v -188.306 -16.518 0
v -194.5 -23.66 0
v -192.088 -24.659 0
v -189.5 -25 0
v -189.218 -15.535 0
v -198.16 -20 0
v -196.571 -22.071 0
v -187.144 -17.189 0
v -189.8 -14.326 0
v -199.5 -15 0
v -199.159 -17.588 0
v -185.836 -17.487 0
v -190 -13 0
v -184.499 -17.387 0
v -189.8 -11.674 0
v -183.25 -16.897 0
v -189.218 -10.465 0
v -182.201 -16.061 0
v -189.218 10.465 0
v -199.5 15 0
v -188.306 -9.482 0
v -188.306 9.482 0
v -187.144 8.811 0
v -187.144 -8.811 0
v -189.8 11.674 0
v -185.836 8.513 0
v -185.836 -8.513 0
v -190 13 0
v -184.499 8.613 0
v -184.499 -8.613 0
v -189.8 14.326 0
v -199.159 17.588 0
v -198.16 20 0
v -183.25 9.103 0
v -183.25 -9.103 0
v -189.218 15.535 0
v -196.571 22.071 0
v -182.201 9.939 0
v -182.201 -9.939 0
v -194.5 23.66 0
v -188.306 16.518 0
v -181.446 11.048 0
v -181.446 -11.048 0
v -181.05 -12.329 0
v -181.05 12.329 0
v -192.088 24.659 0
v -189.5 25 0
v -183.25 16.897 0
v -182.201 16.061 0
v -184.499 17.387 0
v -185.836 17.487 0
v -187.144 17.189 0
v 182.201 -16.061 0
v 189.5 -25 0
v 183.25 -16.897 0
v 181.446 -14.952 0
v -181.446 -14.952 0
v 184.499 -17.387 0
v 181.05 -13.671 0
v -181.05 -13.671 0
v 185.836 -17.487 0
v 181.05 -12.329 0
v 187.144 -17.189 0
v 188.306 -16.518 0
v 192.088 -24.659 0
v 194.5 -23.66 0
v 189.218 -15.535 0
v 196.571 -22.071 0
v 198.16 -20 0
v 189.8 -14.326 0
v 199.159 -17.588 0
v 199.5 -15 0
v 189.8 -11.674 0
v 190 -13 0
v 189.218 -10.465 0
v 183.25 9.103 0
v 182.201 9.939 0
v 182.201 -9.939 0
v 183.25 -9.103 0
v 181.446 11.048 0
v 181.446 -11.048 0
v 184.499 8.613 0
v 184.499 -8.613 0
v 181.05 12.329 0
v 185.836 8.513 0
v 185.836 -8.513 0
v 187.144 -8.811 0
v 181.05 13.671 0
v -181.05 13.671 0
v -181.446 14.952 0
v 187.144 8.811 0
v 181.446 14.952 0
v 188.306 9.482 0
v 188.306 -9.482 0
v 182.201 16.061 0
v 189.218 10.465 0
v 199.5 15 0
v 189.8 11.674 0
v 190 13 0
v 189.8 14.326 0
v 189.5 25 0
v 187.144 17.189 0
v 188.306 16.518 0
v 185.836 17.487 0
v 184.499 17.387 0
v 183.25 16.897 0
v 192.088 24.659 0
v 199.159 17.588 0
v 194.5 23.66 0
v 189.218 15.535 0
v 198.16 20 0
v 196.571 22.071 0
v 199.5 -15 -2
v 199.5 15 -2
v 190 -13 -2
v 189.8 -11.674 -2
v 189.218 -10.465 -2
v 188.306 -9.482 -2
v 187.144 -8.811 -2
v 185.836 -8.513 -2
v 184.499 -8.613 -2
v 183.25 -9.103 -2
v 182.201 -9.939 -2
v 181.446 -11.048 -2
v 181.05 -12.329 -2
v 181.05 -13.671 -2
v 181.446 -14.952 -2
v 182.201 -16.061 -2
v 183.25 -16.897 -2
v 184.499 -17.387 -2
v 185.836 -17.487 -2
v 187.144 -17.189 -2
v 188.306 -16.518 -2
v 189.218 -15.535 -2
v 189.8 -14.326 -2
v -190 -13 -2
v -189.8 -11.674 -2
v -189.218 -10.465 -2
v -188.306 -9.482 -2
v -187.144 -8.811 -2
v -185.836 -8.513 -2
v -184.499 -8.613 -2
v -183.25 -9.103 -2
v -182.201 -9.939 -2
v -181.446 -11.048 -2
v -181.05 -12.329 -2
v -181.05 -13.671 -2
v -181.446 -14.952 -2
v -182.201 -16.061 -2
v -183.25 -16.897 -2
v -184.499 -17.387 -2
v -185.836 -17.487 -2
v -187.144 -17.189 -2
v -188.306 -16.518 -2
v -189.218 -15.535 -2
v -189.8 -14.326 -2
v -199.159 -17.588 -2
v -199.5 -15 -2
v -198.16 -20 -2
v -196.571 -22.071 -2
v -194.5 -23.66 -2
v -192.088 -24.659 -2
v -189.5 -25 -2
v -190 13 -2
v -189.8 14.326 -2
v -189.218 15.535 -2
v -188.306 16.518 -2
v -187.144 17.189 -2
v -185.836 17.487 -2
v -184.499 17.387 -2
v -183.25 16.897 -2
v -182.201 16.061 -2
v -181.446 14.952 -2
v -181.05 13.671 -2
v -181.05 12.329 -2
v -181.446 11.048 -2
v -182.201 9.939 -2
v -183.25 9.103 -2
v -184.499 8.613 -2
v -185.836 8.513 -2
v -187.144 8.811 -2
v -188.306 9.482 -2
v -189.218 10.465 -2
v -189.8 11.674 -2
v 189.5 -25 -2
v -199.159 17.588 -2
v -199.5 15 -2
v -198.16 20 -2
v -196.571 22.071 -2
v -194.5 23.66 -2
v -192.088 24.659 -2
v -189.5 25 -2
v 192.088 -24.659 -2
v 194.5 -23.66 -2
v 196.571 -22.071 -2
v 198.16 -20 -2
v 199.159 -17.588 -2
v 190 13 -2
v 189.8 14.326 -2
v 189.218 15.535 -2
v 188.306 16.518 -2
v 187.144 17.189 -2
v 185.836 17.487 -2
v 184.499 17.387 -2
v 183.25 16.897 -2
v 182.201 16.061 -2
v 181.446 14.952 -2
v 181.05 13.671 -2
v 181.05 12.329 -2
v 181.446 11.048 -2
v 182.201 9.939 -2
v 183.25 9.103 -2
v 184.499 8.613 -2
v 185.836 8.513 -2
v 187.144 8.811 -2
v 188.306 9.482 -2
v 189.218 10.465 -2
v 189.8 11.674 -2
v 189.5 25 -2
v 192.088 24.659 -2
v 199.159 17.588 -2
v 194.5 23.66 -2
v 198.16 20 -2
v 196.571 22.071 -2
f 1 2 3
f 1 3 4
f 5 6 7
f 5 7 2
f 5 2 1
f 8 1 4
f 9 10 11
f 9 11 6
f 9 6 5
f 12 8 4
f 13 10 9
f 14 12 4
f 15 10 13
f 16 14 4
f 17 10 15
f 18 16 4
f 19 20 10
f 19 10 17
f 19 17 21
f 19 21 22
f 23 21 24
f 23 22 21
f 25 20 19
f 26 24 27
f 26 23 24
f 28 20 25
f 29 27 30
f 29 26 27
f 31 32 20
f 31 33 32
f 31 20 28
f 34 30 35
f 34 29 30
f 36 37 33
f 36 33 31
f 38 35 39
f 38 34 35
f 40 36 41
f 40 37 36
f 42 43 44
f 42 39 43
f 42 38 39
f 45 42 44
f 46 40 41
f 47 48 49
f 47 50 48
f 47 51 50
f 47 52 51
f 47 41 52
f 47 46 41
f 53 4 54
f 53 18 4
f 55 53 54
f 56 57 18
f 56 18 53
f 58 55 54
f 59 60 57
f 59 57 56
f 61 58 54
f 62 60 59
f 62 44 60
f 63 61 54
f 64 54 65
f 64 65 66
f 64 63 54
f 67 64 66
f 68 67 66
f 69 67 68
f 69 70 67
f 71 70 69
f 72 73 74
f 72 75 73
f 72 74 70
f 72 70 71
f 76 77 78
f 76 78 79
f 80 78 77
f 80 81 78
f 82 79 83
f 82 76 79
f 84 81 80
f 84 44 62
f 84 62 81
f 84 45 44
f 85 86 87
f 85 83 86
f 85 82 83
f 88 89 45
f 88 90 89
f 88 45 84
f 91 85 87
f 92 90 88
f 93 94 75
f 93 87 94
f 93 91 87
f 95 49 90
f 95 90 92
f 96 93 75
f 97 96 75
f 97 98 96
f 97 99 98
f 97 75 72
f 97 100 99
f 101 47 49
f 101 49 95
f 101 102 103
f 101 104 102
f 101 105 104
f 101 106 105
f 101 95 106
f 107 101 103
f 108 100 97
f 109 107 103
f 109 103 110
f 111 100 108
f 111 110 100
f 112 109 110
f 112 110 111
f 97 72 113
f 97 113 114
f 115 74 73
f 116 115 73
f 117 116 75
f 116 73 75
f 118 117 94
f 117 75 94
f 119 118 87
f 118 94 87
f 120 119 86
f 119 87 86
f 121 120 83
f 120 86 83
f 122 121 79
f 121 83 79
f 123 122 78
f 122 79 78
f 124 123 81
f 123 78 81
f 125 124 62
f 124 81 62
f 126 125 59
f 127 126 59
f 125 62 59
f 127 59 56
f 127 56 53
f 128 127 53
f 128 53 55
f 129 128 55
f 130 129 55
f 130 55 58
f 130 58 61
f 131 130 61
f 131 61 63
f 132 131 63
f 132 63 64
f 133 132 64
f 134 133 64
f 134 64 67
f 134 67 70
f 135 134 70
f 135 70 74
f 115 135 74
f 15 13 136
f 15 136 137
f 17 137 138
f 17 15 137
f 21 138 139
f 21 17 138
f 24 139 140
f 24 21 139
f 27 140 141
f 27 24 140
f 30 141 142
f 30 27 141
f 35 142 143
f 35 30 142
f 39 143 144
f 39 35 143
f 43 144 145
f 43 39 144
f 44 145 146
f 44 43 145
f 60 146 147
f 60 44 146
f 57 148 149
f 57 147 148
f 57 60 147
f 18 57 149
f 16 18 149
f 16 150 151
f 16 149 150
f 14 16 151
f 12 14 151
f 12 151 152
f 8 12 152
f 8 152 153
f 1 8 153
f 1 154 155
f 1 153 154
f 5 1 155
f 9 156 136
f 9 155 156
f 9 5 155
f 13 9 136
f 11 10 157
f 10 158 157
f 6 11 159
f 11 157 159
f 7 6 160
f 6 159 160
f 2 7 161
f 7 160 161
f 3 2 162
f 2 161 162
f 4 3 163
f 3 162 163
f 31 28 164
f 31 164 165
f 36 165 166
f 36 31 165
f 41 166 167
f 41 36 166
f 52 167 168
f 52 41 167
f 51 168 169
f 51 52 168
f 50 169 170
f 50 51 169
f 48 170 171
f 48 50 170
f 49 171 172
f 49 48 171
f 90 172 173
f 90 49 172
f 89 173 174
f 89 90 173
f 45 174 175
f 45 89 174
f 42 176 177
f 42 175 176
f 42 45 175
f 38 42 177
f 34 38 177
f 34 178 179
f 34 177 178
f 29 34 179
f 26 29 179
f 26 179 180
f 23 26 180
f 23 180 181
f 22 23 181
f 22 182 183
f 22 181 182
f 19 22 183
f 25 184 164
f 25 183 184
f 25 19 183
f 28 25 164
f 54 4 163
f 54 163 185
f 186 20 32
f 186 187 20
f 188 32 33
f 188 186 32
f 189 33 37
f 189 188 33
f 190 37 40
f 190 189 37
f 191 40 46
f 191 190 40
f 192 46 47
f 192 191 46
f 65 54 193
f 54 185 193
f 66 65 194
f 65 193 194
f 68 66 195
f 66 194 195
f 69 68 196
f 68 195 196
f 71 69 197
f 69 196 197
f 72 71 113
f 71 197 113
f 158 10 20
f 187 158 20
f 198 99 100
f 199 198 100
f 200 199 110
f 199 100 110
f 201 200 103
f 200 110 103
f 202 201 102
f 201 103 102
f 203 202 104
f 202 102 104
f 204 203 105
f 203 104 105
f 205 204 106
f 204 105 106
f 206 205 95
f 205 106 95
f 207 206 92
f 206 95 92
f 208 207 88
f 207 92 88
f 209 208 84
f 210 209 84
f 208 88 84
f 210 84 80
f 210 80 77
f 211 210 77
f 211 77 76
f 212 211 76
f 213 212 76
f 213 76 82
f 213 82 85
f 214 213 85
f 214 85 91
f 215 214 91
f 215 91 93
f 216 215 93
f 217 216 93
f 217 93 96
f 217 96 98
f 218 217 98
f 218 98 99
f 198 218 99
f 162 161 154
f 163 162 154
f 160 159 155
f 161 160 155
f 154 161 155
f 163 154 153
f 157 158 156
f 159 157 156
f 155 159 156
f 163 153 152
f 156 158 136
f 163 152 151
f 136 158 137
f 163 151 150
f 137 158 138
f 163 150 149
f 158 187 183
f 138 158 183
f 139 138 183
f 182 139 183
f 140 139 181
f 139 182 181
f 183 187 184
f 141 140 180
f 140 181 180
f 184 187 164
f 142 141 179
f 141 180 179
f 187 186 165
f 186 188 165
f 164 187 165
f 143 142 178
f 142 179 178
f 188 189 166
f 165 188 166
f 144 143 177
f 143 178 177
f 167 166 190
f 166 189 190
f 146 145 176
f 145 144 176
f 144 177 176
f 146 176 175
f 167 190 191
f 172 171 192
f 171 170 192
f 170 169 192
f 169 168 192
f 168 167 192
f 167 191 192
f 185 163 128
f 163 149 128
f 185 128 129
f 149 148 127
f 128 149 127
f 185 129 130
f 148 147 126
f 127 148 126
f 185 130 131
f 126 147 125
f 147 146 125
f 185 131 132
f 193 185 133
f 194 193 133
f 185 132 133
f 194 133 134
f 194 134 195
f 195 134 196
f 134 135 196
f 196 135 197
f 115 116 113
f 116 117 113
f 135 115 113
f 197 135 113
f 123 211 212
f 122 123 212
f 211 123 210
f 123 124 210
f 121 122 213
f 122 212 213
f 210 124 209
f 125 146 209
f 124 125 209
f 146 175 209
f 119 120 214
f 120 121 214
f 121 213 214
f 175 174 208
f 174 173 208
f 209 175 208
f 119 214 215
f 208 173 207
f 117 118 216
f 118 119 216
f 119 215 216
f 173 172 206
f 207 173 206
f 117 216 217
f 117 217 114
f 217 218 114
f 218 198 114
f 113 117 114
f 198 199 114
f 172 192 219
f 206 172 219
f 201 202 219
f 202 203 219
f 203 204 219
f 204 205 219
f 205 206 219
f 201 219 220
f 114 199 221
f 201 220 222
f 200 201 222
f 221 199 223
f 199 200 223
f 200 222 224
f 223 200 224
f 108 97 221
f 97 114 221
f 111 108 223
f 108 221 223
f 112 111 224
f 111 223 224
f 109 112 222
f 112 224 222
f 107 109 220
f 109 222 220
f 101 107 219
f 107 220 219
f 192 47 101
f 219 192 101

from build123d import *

# Parameters (mm, degrees)
SKETCH1_W            = 399
SKETCH1_H            = 50
BASE_FLANGE1_DEPTH   = 2
FILLET1_R            = 10
M8_CLEARANCE_HOLE1_D = 9


# Sheet-metal steps are written as plain solids
with BuildPart() as part:
    # Sketch1 → Base-Flange1 (new body)
    with BuildSketch(Plane.XY):
        Rectangle(SKETCH1_W, SKETCH1_H)
    extrude(amount=-BASE_FLANGE1_DEPTH)

    # Fillet1
    fillet1_edges = [part.edges().sort_by_distance(p)[0] for p in [
        (199.5, -25, -1),
        (-199.5, -25, -1),
        (-199.5, 25, -1),
        (199.5, 25, -1),
    ]]
    fillet(fillet1_edges, radius=FILLET1_R)

    # M8 Clearance Hole1 (through all)
    with Locations(Plane(origin=(0, 0, -2), x_dir=(-1, 0, 0), z_dir=(0, 0, -1))):
        with Locations((-185.5, 13), (-185.5, -13)):
            m8_clearance_hole1 = Hole(M8_CLEARANCE_HOLE1_D / 2)

    # Mirror1: M8 Clearance Hole1 across plane
    add(m8_clearance_hole1.mirror(Plane(origin=(0, 0, 0), x_dir=(0, 0, 1), z_dir=(1, 0, 0))), mode=Mode.SUBTRACT)


solid = part.part
